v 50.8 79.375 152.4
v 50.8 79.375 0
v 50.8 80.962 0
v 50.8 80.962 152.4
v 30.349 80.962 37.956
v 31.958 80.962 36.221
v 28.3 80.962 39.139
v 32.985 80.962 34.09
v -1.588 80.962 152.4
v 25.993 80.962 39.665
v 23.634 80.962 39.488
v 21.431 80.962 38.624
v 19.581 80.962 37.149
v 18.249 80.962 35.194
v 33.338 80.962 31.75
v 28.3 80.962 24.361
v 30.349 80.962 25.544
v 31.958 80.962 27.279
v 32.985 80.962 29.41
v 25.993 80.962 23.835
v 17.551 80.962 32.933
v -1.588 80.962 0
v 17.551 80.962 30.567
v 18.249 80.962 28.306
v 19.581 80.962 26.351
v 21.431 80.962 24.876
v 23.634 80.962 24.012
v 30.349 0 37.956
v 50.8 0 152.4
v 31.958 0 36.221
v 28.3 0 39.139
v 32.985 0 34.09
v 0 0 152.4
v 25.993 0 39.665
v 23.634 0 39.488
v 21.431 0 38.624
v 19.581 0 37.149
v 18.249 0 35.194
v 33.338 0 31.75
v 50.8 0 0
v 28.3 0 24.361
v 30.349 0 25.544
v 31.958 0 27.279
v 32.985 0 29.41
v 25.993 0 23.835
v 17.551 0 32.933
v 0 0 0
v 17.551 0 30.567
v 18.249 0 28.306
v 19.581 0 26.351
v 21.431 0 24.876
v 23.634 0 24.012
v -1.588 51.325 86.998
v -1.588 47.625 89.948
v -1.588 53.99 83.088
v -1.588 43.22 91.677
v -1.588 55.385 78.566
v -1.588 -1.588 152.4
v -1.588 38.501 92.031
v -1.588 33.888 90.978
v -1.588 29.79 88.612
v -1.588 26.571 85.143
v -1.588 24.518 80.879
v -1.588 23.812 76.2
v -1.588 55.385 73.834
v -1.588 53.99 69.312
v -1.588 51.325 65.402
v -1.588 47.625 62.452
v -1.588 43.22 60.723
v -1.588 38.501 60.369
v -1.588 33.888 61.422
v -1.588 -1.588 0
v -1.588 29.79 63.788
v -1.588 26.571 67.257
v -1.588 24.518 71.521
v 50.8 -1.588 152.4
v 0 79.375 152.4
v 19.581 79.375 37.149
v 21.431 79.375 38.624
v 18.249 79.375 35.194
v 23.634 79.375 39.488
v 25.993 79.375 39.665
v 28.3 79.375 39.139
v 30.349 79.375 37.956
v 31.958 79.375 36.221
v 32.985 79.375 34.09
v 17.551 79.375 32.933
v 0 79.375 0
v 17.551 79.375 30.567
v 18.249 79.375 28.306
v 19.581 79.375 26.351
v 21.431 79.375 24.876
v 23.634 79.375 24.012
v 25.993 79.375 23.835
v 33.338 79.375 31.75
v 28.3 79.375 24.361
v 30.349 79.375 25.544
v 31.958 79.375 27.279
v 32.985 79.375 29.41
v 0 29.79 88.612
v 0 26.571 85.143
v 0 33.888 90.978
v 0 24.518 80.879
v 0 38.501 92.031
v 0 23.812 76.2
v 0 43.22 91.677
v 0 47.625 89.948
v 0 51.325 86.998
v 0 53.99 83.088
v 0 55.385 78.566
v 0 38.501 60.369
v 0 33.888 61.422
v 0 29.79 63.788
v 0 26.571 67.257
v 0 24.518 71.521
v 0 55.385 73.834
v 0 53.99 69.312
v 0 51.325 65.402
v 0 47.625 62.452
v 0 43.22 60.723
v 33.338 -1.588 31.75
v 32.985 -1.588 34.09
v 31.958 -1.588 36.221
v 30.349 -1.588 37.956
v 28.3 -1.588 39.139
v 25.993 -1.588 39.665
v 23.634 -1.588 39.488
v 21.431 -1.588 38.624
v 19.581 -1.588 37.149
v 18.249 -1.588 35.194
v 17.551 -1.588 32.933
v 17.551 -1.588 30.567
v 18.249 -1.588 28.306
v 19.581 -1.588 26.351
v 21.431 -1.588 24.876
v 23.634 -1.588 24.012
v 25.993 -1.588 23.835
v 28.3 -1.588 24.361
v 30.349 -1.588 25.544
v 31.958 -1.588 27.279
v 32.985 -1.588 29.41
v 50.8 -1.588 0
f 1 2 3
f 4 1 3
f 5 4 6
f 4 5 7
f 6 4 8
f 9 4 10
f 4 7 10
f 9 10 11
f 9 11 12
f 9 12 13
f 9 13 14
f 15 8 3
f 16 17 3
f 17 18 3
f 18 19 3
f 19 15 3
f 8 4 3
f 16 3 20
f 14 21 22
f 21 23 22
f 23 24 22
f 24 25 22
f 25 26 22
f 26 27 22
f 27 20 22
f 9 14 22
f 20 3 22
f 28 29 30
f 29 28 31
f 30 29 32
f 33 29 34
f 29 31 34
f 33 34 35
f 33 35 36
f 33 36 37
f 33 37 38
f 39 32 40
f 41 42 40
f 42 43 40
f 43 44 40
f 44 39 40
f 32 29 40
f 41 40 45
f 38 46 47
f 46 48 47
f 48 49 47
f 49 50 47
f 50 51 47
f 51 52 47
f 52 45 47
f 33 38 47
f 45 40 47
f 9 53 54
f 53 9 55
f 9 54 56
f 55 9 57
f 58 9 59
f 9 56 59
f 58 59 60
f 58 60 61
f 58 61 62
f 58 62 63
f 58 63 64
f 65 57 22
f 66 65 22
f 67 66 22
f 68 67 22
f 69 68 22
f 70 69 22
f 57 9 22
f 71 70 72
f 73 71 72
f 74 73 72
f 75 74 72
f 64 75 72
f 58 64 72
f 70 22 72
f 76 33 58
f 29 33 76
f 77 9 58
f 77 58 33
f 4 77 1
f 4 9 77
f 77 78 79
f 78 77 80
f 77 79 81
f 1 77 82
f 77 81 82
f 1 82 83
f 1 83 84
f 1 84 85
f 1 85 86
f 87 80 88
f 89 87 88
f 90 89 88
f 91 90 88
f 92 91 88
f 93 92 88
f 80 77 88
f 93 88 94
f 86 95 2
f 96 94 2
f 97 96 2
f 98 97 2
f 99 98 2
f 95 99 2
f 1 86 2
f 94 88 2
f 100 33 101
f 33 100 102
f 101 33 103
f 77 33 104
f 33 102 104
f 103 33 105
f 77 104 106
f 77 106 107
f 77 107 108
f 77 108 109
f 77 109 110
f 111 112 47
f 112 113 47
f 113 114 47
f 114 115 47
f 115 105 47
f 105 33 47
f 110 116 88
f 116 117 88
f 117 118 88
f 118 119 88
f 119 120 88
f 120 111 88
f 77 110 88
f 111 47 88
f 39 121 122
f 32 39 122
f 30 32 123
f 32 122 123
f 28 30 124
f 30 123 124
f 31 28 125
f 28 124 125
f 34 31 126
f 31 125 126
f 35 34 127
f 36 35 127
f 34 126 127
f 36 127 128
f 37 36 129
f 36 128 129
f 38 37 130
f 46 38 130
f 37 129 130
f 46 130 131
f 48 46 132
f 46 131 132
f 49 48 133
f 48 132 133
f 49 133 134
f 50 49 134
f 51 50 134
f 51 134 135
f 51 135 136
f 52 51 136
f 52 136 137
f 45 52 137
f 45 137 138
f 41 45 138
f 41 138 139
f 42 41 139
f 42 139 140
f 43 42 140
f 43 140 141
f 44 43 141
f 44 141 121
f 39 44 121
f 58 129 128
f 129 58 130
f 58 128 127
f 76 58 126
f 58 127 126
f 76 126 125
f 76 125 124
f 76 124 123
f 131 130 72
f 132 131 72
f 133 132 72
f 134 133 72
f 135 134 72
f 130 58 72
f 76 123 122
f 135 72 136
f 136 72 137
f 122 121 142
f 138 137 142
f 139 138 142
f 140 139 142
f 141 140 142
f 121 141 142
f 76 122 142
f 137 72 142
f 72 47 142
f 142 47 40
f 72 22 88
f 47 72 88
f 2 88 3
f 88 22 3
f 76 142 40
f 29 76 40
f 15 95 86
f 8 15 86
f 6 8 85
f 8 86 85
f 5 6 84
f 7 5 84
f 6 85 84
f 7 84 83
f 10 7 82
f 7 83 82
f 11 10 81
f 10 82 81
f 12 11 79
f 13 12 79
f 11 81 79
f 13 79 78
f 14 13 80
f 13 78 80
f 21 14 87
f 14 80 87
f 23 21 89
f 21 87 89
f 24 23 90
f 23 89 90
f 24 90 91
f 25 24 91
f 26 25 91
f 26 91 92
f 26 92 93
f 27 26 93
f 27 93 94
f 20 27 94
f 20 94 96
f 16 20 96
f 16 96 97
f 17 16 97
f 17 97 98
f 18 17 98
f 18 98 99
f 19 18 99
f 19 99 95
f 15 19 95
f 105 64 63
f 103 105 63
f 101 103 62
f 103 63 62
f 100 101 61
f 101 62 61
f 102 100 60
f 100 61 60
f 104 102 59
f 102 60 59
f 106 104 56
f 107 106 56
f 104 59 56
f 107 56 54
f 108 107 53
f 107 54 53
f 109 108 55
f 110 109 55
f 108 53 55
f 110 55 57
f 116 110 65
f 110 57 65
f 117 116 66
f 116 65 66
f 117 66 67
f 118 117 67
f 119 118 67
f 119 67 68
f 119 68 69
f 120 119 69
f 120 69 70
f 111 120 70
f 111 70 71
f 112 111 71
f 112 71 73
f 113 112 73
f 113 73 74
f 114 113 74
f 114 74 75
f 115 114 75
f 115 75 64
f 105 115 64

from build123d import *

# Parameters (mm, degrees)
F1_DEPTH = 152.4
F2_R     = 15.875
F3_DEPTH = 25.4
F4_R     = 7.9375
F5_DEPTH = 82.55


with BuildPart() as f1:
    # F0 (on Top) → F1 (new body)
    with BuildSketch(Plane.XY):
        Polygon((0, 79.375), (50.8, 79.375), (50.8, 80.9625), (-1.5875, 80.9625), (-1.5875, -1.5875), (50.8, -1.5875), (50.8, 0), (0, 0), align=None)
    extrude(amount=F1_DEPTH)

    # F2 (on face) → F3 (cut)
    with BuildSketch(Plane(origin=(-1.5875, 0, 0), x_dir=(0, -1, 0), z_dir=(-1, 0, 0))):
        with Locations((-39.6875, 76.2)):
            Circle(F2_R)
    extrude(amount=-F3_DEPTH, mode=Mode.SUBTRACT)

    # F4 (on face) → F5 (cut, through all)
    with BuildSketch(Plane.XZ.offset(1.5875)):
        with Locations((25.4, 31.75)):
            Circle(F4_R)
    extrude(amount=-F5_DEPTH, mode=Mode.SUBTRACT)


solid = f1.part
